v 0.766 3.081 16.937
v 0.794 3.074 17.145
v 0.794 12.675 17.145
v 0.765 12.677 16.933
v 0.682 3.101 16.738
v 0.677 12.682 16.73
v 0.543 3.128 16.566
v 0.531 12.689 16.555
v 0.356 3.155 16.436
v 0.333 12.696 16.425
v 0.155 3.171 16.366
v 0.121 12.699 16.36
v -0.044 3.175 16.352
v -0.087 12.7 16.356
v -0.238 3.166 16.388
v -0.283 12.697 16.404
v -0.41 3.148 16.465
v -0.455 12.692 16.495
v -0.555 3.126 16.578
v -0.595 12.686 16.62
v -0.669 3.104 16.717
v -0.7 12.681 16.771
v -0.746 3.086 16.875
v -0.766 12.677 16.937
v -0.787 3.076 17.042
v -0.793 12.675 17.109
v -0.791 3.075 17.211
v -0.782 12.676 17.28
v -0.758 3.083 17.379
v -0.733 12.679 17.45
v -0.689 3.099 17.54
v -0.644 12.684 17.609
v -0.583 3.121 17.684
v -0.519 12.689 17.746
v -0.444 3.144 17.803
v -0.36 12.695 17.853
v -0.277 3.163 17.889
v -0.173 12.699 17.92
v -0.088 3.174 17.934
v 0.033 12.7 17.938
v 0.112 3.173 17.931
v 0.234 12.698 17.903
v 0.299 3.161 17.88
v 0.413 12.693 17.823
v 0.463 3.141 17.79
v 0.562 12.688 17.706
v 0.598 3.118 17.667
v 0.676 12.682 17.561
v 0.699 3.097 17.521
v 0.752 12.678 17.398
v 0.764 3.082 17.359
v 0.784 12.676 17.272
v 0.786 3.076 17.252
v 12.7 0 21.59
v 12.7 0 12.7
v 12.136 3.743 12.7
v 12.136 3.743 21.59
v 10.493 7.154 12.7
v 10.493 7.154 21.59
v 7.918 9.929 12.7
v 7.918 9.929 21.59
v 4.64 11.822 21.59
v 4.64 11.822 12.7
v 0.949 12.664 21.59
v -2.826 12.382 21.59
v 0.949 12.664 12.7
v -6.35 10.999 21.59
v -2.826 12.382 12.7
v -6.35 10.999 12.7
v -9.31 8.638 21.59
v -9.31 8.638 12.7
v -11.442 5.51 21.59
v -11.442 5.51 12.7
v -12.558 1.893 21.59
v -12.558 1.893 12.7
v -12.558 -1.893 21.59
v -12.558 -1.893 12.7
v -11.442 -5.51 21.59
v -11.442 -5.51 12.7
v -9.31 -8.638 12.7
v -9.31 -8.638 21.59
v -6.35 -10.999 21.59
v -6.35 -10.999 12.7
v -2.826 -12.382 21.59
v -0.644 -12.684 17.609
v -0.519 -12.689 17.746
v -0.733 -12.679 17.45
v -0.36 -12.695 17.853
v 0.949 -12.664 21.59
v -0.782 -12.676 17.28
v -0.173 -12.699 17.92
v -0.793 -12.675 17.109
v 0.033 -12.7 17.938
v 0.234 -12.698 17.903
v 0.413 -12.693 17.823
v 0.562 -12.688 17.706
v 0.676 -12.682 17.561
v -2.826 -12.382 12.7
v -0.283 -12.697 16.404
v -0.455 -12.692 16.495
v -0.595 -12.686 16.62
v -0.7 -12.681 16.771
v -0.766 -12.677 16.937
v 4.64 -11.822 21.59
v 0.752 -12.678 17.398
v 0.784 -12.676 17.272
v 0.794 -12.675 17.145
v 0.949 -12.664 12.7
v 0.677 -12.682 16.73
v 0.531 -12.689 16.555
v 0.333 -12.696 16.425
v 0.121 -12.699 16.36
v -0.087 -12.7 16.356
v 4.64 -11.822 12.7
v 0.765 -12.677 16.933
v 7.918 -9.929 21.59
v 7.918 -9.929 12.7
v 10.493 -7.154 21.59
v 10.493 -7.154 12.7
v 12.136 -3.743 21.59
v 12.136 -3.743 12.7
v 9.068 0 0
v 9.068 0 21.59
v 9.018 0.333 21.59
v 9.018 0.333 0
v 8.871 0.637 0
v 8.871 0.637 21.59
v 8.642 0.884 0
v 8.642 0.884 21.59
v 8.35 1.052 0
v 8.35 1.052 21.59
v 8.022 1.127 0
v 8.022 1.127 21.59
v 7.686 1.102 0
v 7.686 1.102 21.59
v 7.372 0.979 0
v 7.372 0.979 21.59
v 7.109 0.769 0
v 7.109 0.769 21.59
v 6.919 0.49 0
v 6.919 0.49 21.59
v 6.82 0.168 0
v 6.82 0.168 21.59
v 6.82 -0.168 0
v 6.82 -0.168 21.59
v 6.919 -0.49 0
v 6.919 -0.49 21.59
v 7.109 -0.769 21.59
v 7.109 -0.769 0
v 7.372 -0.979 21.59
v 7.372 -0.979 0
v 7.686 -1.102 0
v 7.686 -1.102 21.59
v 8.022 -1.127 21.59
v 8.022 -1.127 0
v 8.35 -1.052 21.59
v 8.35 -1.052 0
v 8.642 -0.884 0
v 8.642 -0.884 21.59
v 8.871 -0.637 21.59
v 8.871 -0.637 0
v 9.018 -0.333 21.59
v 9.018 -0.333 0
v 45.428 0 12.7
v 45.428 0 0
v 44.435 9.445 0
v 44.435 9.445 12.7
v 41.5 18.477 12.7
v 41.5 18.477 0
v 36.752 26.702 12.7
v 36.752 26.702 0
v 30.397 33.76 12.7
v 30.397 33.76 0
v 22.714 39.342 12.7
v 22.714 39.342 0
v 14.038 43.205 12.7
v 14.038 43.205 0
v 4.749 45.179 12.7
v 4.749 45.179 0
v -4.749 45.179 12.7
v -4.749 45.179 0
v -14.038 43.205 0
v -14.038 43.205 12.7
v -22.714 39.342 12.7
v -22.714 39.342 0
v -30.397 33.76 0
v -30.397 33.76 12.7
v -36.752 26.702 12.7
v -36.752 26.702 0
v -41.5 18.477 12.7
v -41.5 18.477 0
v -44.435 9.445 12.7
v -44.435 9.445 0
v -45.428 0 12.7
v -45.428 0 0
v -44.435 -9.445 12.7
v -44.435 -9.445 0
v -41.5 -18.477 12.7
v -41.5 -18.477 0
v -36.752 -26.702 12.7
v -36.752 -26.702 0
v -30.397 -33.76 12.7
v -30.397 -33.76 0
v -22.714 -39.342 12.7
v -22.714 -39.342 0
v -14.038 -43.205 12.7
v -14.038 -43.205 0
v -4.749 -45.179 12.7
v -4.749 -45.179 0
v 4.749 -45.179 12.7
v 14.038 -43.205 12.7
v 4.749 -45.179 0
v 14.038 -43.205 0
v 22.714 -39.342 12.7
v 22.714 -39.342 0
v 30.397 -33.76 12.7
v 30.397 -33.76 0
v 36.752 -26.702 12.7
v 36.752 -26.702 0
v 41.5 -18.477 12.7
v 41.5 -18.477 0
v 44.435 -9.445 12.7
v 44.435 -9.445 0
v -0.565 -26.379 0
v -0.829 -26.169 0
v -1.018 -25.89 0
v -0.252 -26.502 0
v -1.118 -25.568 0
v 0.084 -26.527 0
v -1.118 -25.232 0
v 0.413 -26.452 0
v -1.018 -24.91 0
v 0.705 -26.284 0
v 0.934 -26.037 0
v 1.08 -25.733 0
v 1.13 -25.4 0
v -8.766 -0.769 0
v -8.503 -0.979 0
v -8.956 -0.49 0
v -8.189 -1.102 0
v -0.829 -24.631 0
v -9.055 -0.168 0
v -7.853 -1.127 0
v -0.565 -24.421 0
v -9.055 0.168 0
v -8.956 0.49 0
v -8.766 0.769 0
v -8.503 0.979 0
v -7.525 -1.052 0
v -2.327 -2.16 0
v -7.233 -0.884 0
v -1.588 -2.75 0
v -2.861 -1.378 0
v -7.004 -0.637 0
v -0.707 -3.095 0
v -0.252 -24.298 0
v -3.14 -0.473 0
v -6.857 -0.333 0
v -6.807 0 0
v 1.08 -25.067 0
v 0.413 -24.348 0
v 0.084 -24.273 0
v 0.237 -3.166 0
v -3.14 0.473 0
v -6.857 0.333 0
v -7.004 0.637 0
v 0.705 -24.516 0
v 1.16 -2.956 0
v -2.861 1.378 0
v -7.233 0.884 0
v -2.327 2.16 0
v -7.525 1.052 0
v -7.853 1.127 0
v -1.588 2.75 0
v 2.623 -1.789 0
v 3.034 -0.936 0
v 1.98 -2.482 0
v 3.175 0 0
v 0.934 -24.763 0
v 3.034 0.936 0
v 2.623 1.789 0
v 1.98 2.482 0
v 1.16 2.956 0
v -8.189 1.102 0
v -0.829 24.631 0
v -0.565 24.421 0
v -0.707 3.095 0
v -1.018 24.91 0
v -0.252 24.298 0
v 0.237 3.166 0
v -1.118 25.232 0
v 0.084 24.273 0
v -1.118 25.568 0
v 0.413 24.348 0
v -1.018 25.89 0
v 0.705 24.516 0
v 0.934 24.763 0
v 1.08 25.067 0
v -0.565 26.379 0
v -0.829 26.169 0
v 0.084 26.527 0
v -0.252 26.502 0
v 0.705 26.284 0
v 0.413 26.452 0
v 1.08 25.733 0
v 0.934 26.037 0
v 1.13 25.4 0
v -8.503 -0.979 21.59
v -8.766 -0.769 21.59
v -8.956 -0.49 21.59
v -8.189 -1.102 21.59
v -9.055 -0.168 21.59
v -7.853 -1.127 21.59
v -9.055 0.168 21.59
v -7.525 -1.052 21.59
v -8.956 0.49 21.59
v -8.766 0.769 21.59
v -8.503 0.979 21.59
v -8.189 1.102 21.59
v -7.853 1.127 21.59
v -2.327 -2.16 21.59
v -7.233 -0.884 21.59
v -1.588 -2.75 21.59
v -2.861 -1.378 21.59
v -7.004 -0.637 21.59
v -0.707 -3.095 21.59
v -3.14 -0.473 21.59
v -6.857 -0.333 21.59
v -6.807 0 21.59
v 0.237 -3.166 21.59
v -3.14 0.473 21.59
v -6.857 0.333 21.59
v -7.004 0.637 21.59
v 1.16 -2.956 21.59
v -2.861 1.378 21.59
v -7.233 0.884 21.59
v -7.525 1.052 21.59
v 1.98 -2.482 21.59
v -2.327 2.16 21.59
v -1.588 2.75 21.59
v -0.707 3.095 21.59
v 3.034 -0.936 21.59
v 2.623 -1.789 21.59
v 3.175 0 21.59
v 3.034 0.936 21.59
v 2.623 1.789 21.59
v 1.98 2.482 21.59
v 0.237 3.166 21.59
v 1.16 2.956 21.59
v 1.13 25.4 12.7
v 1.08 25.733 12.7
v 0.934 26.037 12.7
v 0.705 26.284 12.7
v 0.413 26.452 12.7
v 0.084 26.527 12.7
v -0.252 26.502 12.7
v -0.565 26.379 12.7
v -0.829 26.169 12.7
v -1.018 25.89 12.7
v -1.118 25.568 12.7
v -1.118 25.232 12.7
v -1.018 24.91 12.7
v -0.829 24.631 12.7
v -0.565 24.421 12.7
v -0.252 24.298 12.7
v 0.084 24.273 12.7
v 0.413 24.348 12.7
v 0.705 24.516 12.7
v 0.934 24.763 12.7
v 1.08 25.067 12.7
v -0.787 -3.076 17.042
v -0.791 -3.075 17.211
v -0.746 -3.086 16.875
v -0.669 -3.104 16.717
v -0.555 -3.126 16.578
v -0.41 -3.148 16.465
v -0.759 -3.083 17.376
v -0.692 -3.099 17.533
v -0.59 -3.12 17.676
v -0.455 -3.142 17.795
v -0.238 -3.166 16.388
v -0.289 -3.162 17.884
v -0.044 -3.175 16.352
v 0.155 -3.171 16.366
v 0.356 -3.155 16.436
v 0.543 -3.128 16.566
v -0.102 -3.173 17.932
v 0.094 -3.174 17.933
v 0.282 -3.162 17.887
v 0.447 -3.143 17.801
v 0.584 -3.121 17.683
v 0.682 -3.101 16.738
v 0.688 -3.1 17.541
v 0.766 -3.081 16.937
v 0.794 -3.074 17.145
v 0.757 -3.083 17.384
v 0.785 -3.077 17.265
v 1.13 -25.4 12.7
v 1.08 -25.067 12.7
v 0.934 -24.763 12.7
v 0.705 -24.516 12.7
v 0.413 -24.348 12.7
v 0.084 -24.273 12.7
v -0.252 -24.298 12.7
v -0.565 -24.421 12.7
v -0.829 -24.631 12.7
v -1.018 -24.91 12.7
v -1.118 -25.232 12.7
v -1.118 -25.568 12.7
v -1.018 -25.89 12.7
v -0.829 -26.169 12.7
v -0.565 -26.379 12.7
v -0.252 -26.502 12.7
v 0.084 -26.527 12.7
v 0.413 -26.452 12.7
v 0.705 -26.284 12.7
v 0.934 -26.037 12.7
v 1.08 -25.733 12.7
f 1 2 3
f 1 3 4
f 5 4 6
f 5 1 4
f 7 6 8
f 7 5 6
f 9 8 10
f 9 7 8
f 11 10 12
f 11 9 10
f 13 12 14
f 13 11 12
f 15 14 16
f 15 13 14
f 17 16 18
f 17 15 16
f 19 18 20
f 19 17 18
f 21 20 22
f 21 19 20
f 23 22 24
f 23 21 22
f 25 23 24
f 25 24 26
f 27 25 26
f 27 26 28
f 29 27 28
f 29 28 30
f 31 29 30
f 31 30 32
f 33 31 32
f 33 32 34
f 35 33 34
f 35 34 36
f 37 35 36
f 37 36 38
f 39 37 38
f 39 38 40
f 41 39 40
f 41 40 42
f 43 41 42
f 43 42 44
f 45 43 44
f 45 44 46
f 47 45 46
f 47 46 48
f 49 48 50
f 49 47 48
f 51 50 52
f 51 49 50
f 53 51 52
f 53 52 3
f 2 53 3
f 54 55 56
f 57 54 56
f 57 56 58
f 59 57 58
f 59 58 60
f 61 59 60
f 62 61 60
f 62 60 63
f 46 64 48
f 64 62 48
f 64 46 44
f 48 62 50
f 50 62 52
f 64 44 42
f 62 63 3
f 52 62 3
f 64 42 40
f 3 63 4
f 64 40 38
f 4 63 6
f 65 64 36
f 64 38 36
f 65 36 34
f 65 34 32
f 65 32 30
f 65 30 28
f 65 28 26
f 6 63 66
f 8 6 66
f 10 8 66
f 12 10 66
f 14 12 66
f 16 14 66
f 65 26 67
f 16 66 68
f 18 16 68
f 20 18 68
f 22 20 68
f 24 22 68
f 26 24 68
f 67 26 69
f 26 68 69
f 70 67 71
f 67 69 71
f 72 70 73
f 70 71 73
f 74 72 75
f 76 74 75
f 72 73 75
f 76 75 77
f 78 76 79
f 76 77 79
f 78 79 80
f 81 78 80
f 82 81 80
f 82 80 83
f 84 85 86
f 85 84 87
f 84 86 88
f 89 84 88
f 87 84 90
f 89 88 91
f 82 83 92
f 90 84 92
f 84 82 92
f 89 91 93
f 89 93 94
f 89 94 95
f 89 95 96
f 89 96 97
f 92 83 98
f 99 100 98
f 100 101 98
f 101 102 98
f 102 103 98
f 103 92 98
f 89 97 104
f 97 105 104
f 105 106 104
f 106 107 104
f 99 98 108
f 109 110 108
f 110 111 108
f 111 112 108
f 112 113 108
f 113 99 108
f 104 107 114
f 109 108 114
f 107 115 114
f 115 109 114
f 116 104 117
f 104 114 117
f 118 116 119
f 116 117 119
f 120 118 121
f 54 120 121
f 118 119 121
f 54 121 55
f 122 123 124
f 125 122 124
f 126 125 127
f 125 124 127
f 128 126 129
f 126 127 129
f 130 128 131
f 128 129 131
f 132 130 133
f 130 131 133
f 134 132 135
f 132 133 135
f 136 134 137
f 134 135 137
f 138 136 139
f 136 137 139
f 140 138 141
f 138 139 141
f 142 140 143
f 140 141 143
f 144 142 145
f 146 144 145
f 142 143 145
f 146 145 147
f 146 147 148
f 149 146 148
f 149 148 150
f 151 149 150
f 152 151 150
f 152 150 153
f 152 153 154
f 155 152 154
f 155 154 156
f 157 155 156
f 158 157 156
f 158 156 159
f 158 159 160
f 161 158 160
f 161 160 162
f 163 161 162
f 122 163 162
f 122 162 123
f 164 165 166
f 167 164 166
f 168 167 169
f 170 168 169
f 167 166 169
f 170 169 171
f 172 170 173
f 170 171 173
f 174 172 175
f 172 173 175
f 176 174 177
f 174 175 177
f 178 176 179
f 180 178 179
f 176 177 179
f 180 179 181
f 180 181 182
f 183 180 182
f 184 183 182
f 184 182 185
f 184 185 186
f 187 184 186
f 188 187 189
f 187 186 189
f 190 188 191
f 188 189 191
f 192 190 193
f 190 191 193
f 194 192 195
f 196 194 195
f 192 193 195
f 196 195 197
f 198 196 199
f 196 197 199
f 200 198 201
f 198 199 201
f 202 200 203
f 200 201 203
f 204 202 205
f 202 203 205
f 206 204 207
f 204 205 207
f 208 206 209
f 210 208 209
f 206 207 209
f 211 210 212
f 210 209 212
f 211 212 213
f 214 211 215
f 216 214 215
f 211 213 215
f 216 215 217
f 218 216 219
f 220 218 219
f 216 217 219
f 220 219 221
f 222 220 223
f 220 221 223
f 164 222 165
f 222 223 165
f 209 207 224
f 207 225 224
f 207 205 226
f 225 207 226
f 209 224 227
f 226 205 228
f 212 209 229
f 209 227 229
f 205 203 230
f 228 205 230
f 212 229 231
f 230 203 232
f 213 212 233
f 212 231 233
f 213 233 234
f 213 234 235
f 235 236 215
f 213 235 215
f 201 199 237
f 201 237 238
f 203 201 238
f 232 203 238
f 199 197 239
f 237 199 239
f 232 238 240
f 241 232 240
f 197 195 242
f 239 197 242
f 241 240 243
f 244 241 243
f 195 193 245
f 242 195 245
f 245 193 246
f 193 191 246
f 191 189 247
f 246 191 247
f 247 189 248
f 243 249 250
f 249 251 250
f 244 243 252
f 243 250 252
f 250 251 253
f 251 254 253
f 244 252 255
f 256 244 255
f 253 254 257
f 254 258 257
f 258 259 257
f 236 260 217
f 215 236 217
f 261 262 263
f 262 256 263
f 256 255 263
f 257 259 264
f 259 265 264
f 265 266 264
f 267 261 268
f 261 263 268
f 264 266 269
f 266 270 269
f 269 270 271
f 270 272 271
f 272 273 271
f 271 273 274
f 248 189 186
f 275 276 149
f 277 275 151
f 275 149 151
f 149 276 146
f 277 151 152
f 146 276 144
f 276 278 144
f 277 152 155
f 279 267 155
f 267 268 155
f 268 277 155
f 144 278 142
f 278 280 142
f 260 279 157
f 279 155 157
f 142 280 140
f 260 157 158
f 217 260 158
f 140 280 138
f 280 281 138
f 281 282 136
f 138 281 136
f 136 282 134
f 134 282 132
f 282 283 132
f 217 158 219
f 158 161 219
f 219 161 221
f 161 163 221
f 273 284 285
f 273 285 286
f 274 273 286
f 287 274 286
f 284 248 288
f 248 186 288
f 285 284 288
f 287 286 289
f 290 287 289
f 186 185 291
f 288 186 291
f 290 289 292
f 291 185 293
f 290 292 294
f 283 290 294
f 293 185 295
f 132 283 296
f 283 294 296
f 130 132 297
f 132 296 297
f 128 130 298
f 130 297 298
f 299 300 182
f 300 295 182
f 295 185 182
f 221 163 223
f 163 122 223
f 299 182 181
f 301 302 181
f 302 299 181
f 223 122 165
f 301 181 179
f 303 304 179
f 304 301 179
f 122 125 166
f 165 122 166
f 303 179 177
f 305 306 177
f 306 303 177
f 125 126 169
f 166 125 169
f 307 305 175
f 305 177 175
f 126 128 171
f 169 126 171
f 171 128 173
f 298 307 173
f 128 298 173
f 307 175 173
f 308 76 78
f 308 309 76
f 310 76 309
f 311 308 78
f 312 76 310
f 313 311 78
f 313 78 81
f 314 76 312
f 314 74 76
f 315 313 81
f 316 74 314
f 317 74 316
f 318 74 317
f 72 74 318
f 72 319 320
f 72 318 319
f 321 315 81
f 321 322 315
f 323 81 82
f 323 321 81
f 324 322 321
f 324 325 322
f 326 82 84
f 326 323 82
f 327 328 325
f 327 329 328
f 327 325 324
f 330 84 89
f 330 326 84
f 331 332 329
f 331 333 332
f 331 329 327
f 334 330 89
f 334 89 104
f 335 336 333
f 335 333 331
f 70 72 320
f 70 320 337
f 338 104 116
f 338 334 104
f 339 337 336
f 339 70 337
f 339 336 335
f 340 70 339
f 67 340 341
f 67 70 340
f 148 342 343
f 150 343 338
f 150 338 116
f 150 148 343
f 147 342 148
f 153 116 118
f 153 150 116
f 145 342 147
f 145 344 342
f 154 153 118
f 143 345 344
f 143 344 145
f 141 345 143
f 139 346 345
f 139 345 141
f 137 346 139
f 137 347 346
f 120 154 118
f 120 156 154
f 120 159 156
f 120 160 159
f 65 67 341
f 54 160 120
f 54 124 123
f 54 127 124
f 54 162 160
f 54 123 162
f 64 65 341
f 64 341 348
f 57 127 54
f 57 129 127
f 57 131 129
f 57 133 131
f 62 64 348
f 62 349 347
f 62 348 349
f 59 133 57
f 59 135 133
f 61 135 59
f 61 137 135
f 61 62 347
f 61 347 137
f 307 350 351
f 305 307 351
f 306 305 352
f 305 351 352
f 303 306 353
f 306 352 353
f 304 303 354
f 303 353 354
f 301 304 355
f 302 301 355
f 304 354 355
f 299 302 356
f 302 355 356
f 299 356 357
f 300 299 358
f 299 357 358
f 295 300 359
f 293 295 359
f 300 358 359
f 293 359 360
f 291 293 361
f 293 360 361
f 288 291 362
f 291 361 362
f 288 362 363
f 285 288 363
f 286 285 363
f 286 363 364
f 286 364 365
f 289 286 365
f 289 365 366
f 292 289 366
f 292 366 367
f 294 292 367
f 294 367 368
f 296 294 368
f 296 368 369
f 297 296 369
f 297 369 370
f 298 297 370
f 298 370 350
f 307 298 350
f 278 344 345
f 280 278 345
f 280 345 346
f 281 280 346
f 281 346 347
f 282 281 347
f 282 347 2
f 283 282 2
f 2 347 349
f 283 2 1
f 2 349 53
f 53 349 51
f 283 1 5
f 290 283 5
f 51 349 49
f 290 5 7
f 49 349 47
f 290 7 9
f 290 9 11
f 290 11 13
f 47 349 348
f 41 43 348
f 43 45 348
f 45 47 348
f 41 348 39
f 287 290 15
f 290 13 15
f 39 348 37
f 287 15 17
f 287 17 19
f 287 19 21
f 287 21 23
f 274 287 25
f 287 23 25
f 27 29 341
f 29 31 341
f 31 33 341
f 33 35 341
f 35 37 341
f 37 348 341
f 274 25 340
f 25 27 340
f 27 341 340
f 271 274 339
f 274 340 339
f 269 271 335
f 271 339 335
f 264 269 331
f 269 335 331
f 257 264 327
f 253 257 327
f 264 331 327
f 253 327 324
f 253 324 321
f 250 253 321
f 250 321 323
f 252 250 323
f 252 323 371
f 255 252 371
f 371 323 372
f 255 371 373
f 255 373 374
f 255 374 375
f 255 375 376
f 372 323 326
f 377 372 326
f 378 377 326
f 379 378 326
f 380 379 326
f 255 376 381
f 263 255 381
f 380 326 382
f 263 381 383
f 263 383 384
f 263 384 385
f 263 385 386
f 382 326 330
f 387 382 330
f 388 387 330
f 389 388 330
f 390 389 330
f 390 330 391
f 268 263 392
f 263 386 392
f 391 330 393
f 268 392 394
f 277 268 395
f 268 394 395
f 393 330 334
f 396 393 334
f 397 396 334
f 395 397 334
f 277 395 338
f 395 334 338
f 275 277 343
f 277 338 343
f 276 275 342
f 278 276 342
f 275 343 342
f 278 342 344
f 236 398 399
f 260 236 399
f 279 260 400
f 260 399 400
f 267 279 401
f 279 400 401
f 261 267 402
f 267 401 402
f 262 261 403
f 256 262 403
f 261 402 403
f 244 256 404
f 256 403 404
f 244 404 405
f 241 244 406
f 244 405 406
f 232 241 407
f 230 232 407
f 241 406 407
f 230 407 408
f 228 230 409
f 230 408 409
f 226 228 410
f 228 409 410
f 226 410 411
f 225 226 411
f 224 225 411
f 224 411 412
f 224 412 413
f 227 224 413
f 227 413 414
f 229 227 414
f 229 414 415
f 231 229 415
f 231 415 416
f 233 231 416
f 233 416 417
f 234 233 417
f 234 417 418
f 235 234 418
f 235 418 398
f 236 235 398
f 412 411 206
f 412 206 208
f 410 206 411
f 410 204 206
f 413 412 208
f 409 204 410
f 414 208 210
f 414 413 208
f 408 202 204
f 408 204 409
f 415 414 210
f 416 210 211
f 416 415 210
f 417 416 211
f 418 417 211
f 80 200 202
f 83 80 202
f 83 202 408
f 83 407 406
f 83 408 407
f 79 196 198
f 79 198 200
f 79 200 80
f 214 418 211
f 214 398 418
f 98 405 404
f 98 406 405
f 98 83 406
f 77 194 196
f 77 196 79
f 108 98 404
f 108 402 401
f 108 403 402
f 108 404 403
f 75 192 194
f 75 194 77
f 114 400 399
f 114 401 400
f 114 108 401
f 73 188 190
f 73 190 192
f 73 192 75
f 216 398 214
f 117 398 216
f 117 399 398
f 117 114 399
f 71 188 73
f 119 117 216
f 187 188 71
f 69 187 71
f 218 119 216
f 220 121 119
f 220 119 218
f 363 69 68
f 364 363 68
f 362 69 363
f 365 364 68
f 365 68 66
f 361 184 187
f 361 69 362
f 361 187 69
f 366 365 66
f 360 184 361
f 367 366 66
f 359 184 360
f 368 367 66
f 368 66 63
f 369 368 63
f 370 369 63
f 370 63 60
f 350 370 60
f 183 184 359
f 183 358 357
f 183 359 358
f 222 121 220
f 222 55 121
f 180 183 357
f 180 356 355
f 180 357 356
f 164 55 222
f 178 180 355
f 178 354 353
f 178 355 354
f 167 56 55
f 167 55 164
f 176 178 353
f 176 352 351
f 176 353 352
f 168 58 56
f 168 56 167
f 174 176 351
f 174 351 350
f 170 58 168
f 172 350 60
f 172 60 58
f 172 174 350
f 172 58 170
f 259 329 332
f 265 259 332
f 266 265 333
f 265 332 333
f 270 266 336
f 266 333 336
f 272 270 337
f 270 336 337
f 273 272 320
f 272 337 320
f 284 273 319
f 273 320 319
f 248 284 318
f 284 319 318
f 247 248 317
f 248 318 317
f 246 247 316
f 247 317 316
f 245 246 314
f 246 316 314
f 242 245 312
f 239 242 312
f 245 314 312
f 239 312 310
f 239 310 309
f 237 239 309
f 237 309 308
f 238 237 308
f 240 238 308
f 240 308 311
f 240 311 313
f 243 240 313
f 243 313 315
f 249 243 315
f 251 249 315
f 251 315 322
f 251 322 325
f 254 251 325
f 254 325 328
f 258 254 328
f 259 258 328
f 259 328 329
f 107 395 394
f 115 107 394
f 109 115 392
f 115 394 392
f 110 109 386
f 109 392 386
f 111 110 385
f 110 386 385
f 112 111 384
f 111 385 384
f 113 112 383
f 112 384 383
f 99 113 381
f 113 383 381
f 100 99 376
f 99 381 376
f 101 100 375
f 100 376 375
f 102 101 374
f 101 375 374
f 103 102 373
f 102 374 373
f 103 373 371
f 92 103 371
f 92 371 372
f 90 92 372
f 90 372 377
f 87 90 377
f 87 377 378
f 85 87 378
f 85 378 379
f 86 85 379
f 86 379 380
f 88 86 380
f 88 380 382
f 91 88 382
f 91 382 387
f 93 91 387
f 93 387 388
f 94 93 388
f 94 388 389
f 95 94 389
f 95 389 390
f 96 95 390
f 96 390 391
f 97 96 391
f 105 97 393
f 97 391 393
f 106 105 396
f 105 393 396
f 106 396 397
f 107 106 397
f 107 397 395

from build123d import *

# Parameters (mm, degrees)
SKETCH2_R               = 45.4279
BOSS_EXTRUDE1_DEPTH     = 12.7
SKETCH3_R               = 12.7
BOSS_EXTRUDE2_DEPTH     = 8.89
SKETCH4_R               = 3.175
SKETCH4_R_2             = 1.1303
CUT_EXTRUDE1_DEPTH      = 22.59
SKETCH5_R               = 0.79375
CUT_EXTRUDE2_DEPTH      = 46.4279
CUT_EXTRUDE2_DEPTH_BACK = 46.4279
SKETCH6_R               = 1.1303
CUT_EXTRUDE3_DEPTH      = 13.7000001


with BuildPart() as part:
    # Sketch2 → Boss-Extrude1 (new body)
    with BuildSketch(Plane.XY):
        Circle(SKETCH2_R)
    extrude(amount=BOSS_EXTRUDE1_DEPTH)

    # Sketch3 → Boss-Extrude2 (add)
    with BuildSketch(Plane.XY.offset(12.7)):
        Circle(SKETCH3_R)
    extrude(amount=BOSS_EXTRUDE2_DEPTH)

    # Sketch4 → Cut-Extrude1 (cut, through all)
    with BuildSketch(Plane.XY.offset(21.59)):
        Circle(SKETCH4_R)
        with Locations((-7.9375, 0)):
            Circle(SKETCH4_R_2)
        with Locations((7.9375, 0)):
            Circle(SKETCH4_R_2)
    extrude(amount=-CUT_EXTRUDE1_DEPTH, mode=Mode.SUBTRACT)

    # Sketch5 → Cut-Extrude2 (cut, two sides)
    with BuildSketch(Plane(origin=(0, 0, 0), x_dir=(1, 0, 0), z_dir=(0, 1, 0))) as cut_extrude2_sk:
        with Locations((0, -17.145)):
            Circle(SKETCH5_R)
    extrude(amount=CUT_EXTRUDE2_DEPTH, mode=Mode.SUBTRACT)
    extrude(cut_extrude2_sk.sketch, amount=-CUT_EXTRUDE2_DEPTH_BACK, mode=Mode.SUBTRACT)

    # Sketch6 → Cut-Extrude3 (cut, through all)
    with BuildSketch(Plane.XY.offset(12.7)):
        with Locations((0, 25.4)):
            Circle(SKETCH6_R)
        with Locations((0, -25.4)):
            Circle(SKETCH6_R)
    extrude(amount=-CUT_EXTRUDE3_DEPTH, mode=Mode.SUBTRACT)


solid = part.part
